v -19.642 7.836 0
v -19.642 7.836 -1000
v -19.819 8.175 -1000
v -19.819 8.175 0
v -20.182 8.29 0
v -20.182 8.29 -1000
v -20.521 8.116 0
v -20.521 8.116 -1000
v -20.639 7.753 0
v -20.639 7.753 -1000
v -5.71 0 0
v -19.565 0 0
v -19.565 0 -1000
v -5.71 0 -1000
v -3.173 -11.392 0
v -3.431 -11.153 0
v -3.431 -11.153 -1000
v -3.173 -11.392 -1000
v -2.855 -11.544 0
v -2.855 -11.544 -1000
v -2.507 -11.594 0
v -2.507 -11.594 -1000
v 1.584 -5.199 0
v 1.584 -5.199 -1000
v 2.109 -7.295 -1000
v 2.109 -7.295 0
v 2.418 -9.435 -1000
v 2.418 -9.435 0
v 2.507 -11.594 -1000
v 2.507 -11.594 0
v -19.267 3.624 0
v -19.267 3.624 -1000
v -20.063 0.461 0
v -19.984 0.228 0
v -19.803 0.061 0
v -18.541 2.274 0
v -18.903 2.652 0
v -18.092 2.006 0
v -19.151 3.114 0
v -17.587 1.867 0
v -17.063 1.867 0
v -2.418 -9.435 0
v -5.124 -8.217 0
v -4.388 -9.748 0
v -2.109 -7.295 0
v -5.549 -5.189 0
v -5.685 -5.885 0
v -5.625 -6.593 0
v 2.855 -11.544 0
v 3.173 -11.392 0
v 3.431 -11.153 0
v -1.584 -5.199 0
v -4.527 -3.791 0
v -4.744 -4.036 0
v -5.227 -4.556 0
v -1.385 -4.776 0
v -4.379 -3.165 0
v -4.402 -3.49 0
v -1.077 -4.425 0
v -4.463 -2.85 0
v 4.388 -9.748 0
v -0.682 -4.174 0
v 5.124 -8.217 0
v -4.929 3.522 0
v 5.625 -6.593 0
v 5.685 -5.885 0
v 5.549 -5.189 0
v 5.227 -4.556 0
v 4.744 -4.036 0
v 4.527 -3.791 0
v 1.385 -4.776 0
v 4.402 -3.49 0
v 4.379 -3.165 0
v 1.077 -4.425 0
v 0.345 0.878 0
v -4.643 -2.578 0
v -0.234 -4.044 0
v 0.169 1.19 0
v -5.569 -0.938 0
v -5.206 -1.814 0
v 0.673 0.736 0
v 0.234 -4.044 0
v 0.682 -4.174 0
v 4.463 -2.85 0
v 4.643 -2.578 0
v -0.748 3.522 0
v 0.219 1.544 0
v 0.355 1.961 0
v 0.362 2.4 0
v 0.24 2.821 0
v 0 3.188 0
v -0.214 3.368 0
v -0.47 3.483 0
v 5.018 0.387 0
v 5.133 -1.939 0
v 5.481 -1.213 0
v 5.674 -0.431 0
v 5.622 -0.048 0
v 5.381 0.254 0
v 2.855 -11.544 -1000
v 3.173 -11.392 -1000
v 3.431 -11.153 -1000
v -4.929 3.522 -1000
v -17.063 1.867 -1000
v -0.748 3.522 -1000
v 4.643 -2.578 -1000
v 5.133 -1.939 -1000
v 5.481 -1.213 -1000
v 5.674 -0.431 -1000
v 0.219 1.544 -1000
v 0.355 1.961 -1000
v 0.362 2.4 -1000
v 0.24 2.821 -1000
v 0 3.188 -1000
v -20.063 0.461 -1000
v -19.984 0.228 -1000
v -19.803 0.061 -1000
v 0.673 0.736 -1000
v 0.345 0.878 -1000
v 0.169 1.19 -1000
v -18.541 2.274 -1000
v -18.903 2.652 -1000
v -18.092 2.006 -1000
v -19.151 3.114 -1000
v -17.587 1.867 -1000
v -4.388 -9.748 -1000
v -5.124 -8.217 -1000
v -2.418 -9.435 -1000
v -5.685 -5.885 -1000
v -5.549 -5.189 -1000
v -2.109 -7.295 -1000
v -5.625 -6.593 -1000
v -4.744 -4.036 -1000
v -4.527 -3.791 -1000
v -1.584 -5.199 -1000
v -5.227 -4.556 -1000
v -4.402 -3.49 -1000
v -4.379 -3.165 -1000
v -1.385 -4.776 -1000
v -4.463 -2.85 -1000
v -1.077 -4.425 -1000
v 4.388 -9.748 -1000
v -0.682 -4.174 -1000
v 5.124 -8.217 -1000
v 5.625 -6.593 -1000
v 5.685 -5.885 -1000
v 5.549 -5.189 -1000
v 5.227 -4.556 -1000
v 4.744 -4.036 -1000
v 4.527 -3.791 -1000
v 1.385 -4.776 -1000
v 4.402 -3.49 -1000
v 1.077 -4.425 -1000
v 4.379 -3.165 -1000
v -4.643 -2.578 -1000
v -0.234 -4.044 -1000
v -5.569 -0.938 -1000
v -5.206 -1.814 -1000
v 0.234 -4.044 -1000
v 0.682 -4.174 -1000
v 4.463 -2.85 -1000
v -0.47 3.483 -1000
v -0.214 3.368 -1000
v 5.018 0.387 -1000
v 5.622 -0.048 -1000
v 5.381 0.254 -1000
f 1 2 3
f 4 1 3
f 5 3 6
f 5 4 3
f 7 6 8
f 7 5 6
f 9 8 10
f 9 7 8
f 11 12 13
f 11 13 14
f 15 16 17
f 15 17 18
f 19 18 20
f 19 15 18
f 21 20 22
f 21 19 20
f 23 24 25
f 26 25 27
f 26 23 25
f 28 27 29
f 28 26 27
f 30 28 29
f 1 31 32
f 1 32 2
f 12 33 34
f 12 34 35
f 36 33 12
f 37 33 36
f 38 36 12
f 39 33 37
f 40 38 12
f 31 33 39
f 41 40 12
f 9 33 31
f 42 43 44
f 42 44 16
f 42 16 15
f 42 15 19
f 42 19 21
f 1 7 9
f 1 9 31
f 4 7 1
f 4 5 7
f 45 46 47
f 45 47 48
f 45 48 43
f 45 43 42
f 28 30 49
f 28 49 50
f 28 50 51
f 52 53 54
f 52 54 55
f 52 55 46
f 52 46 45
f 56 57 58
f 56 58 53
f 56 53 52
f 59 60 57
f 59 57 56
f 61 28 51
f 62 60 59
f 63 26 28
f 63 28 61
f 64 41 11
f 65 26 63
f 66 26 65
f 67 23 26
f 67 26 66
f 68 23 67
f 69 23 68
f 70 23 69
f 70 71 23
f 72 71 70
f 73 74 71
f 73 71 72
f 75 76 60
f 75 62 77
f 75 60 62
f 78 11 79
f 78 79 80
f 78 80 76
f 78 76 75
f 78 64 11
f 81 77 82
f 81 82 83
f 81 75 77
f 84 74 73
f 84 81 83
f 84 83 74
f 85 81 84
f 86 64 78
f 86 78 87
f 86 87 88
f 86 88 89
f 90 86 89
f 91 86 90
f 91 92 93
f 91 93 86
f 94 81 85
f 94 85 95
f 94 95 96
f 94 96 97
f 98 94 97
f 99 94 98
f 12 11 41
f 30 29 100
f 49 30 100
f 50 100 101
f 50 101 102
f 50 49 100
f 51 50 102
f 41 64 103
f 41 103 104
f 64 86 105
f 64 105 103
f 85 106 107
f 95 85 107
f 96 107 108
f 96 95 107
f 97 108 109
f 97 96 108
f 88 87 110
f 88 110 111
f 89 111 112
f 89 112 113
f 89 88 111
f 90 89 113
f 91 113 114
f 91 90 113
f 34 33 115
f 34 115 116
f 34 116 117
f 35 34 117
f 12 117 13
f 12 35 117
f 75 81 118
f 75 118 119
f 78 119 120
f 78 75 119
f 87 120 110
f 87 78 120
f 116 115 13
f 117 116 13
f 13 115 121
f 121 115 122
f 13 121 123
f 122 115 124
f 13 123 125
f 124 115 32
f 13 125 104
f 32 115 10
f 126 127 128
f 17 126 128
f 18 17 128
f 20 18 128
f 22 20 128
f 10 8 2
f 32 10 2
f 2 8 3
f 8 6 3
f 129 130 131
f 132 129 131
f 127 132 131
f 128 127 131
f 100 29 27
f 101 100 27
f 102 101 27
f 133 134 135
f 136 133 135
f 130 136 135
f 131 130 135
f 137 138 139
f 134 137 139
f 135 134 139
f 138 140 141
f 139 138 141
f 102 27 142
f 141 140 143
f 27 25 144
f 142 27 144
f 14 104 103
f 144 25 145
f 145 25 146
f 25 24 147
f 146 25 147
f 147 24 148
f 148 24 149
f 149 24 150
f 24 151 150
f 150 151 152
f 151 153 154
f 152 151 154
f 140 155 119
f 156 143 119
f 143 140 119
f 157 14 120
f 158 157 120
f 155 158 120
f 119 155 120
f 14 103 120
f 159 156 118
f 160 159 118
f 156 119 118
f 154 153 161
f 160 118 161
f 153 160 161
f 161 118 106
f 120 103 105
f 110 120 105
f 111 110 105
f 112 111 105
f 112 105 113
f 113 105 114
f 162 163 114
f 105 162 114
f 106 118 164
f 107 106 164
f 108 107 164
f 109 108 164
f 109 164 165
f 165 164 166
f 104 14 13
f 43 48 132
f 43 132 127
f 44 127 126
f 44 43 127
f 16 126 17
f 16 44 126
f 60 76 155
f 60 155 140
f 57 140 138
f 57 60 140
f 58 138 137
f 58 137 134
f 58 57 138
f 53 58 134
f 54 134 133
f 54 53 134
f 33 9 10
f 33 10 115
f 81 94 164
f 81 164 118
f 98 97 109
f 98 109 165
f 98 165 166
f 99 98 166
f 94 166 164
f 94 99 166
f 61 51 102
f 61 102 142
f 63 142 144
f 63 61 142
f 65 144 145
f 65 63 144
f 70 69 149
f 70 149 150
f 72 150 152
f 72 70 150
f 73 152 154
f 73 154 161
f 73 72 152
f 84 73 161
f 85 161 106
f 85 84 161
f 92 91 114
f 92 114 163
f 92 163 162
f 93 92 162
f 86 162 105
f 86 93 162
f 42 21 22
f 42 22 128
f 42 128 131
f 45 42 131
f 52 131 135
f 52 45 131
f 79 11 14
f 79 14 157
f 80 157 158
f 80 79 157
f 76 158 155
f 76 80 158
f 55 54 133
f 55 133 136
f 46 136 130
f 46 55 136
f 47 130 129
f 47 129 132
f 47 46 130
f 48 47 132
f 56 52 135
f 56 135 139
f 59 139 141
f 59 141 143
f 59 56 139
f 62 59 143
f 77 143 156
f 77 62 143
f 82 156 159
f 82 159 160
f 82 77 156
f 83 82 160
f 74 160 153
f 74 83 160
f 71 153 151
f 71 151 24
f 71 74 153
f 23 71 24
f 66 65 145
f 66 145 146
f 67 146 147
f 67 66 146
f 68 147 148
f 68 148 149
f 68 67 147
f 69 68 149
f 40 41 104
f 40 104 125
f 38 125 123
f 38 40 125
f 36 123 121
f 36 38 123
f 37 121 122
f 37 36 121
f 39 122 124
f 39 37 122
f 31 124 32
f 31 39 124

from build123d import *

# Parameters (mm, degrees)
MAIN_EXTRUSION_DEPTH = 1000


with BuildPart() as part:
    # Sk Main Extrusion → Main Extrusion (new body)
    with BuildSketch(Plane.XY):
        with BuildLine():
            Line((-19.564823375, 0), (-5.70955999, 0))
            ThreePointArc((-5.70955999, 0), (-5.414054203, -1.387221791), (-4.643319426, -2.577883736))
            ThreePointArc((-4.643319426, -2.577883736), (-4.376983545, -3.328515195), (-4.743536233, -4.035637189))
            ThreePointArc((-4.743536233, -4.035637189), (-5.549065057, -5.188573329), (-5.624751834, -6.592998458))
            ThreePointArc((-5.624751834, -6.592998458), (-4.784658148, -8.996464386), (-3.4312327, -11.152999901))
            ThreePointArc((-3.4312327, -11.152999901), (-3.019905527, -11.480142613), (-2.506922203, -11.594425189))
            ThreePointArc((-2.506922203, -11.594425189), (-2.291191076, -8.361169229), (-1.583815224, -5.198875216))
            ThreePointArc((-1.583815224, -5.198875216), (0, -4.027016521), (1.583815224, -5.198875216))
            ThreePointArc((1.583815224, -5.198875216), (2.291191076, -8.361169229), (2.506922203, -11.594425189))
            ThreePointArc((2.506922203, -11.594425189), (3.019905527, -11.480142613), (3.4312327, -11.152999901))
            ThreePointArc((3.4312327, -11.152999901), (4.784658148, -8.996464386), (5.624751834, -6.592998458))
            ThreePointArc((5.624751834, -6.592998458), (5.549065057, -5.188573329), (4.743536233, -4.035637189))
            ThreePointArc((4.743536233, -4.035637189), (4.376983545, -3.328515195), (4.643319426, -2.577883736))
            ThreePointArc((4.643319426, -2.577883736), (5.325853836, -1.584808807), (5.673737659, -0.43110699))
            ThreePointArc((5.673737659, -0.43110699), (5.522041744, 0.119270785), (5.017650904, 0.386697835))
            Line((5.017650904, 0.386697835), (0.673438444, 0.736480319))
            ThreePointArc((0.673438444, 0.736480319), (0.231134607, 1.019470764), (0.218560941, 1.544407122))
            ThreePointArc((0.218560941, 1.544407122), (0.362130691, 2.399619674), (0, 3.187567735))
            ThreePointArc((0, 3.187567735), (-0.338135797, 3.434666121), (-0.747703743, 3.522116267))
            Line((-0.747703743, 3.522116267), (-4.928660874, 3.522116267))
            Line((-4.928660874, 3.522116267), (-17.063386647, 1.866924243))
            ThreePointArc((-17.063386647, 1.866924243), (-18.541135771, 2.274001462), (-19.266905518, 3.624080204))
            Line((-19.266905518, 3.624080204), (-19.642313181, 7.836439756))
            ThreePointArc((-19.642313181, 7.836439756), (-20.182201782, 8.290299862), (-20.638789315, 7.752715895))
            Line((-20.638789315, 7.752715895), (-20.063273376, 0.460660486))
            ThreePointArc((-20.063273376, 0.460660486), (-19.904183245, 0.132801309), (-19.564823375, 0))
        make_face()
    extrude(amount=-MAIN_EXTRUSION_DEPTH)


solid = part.part
